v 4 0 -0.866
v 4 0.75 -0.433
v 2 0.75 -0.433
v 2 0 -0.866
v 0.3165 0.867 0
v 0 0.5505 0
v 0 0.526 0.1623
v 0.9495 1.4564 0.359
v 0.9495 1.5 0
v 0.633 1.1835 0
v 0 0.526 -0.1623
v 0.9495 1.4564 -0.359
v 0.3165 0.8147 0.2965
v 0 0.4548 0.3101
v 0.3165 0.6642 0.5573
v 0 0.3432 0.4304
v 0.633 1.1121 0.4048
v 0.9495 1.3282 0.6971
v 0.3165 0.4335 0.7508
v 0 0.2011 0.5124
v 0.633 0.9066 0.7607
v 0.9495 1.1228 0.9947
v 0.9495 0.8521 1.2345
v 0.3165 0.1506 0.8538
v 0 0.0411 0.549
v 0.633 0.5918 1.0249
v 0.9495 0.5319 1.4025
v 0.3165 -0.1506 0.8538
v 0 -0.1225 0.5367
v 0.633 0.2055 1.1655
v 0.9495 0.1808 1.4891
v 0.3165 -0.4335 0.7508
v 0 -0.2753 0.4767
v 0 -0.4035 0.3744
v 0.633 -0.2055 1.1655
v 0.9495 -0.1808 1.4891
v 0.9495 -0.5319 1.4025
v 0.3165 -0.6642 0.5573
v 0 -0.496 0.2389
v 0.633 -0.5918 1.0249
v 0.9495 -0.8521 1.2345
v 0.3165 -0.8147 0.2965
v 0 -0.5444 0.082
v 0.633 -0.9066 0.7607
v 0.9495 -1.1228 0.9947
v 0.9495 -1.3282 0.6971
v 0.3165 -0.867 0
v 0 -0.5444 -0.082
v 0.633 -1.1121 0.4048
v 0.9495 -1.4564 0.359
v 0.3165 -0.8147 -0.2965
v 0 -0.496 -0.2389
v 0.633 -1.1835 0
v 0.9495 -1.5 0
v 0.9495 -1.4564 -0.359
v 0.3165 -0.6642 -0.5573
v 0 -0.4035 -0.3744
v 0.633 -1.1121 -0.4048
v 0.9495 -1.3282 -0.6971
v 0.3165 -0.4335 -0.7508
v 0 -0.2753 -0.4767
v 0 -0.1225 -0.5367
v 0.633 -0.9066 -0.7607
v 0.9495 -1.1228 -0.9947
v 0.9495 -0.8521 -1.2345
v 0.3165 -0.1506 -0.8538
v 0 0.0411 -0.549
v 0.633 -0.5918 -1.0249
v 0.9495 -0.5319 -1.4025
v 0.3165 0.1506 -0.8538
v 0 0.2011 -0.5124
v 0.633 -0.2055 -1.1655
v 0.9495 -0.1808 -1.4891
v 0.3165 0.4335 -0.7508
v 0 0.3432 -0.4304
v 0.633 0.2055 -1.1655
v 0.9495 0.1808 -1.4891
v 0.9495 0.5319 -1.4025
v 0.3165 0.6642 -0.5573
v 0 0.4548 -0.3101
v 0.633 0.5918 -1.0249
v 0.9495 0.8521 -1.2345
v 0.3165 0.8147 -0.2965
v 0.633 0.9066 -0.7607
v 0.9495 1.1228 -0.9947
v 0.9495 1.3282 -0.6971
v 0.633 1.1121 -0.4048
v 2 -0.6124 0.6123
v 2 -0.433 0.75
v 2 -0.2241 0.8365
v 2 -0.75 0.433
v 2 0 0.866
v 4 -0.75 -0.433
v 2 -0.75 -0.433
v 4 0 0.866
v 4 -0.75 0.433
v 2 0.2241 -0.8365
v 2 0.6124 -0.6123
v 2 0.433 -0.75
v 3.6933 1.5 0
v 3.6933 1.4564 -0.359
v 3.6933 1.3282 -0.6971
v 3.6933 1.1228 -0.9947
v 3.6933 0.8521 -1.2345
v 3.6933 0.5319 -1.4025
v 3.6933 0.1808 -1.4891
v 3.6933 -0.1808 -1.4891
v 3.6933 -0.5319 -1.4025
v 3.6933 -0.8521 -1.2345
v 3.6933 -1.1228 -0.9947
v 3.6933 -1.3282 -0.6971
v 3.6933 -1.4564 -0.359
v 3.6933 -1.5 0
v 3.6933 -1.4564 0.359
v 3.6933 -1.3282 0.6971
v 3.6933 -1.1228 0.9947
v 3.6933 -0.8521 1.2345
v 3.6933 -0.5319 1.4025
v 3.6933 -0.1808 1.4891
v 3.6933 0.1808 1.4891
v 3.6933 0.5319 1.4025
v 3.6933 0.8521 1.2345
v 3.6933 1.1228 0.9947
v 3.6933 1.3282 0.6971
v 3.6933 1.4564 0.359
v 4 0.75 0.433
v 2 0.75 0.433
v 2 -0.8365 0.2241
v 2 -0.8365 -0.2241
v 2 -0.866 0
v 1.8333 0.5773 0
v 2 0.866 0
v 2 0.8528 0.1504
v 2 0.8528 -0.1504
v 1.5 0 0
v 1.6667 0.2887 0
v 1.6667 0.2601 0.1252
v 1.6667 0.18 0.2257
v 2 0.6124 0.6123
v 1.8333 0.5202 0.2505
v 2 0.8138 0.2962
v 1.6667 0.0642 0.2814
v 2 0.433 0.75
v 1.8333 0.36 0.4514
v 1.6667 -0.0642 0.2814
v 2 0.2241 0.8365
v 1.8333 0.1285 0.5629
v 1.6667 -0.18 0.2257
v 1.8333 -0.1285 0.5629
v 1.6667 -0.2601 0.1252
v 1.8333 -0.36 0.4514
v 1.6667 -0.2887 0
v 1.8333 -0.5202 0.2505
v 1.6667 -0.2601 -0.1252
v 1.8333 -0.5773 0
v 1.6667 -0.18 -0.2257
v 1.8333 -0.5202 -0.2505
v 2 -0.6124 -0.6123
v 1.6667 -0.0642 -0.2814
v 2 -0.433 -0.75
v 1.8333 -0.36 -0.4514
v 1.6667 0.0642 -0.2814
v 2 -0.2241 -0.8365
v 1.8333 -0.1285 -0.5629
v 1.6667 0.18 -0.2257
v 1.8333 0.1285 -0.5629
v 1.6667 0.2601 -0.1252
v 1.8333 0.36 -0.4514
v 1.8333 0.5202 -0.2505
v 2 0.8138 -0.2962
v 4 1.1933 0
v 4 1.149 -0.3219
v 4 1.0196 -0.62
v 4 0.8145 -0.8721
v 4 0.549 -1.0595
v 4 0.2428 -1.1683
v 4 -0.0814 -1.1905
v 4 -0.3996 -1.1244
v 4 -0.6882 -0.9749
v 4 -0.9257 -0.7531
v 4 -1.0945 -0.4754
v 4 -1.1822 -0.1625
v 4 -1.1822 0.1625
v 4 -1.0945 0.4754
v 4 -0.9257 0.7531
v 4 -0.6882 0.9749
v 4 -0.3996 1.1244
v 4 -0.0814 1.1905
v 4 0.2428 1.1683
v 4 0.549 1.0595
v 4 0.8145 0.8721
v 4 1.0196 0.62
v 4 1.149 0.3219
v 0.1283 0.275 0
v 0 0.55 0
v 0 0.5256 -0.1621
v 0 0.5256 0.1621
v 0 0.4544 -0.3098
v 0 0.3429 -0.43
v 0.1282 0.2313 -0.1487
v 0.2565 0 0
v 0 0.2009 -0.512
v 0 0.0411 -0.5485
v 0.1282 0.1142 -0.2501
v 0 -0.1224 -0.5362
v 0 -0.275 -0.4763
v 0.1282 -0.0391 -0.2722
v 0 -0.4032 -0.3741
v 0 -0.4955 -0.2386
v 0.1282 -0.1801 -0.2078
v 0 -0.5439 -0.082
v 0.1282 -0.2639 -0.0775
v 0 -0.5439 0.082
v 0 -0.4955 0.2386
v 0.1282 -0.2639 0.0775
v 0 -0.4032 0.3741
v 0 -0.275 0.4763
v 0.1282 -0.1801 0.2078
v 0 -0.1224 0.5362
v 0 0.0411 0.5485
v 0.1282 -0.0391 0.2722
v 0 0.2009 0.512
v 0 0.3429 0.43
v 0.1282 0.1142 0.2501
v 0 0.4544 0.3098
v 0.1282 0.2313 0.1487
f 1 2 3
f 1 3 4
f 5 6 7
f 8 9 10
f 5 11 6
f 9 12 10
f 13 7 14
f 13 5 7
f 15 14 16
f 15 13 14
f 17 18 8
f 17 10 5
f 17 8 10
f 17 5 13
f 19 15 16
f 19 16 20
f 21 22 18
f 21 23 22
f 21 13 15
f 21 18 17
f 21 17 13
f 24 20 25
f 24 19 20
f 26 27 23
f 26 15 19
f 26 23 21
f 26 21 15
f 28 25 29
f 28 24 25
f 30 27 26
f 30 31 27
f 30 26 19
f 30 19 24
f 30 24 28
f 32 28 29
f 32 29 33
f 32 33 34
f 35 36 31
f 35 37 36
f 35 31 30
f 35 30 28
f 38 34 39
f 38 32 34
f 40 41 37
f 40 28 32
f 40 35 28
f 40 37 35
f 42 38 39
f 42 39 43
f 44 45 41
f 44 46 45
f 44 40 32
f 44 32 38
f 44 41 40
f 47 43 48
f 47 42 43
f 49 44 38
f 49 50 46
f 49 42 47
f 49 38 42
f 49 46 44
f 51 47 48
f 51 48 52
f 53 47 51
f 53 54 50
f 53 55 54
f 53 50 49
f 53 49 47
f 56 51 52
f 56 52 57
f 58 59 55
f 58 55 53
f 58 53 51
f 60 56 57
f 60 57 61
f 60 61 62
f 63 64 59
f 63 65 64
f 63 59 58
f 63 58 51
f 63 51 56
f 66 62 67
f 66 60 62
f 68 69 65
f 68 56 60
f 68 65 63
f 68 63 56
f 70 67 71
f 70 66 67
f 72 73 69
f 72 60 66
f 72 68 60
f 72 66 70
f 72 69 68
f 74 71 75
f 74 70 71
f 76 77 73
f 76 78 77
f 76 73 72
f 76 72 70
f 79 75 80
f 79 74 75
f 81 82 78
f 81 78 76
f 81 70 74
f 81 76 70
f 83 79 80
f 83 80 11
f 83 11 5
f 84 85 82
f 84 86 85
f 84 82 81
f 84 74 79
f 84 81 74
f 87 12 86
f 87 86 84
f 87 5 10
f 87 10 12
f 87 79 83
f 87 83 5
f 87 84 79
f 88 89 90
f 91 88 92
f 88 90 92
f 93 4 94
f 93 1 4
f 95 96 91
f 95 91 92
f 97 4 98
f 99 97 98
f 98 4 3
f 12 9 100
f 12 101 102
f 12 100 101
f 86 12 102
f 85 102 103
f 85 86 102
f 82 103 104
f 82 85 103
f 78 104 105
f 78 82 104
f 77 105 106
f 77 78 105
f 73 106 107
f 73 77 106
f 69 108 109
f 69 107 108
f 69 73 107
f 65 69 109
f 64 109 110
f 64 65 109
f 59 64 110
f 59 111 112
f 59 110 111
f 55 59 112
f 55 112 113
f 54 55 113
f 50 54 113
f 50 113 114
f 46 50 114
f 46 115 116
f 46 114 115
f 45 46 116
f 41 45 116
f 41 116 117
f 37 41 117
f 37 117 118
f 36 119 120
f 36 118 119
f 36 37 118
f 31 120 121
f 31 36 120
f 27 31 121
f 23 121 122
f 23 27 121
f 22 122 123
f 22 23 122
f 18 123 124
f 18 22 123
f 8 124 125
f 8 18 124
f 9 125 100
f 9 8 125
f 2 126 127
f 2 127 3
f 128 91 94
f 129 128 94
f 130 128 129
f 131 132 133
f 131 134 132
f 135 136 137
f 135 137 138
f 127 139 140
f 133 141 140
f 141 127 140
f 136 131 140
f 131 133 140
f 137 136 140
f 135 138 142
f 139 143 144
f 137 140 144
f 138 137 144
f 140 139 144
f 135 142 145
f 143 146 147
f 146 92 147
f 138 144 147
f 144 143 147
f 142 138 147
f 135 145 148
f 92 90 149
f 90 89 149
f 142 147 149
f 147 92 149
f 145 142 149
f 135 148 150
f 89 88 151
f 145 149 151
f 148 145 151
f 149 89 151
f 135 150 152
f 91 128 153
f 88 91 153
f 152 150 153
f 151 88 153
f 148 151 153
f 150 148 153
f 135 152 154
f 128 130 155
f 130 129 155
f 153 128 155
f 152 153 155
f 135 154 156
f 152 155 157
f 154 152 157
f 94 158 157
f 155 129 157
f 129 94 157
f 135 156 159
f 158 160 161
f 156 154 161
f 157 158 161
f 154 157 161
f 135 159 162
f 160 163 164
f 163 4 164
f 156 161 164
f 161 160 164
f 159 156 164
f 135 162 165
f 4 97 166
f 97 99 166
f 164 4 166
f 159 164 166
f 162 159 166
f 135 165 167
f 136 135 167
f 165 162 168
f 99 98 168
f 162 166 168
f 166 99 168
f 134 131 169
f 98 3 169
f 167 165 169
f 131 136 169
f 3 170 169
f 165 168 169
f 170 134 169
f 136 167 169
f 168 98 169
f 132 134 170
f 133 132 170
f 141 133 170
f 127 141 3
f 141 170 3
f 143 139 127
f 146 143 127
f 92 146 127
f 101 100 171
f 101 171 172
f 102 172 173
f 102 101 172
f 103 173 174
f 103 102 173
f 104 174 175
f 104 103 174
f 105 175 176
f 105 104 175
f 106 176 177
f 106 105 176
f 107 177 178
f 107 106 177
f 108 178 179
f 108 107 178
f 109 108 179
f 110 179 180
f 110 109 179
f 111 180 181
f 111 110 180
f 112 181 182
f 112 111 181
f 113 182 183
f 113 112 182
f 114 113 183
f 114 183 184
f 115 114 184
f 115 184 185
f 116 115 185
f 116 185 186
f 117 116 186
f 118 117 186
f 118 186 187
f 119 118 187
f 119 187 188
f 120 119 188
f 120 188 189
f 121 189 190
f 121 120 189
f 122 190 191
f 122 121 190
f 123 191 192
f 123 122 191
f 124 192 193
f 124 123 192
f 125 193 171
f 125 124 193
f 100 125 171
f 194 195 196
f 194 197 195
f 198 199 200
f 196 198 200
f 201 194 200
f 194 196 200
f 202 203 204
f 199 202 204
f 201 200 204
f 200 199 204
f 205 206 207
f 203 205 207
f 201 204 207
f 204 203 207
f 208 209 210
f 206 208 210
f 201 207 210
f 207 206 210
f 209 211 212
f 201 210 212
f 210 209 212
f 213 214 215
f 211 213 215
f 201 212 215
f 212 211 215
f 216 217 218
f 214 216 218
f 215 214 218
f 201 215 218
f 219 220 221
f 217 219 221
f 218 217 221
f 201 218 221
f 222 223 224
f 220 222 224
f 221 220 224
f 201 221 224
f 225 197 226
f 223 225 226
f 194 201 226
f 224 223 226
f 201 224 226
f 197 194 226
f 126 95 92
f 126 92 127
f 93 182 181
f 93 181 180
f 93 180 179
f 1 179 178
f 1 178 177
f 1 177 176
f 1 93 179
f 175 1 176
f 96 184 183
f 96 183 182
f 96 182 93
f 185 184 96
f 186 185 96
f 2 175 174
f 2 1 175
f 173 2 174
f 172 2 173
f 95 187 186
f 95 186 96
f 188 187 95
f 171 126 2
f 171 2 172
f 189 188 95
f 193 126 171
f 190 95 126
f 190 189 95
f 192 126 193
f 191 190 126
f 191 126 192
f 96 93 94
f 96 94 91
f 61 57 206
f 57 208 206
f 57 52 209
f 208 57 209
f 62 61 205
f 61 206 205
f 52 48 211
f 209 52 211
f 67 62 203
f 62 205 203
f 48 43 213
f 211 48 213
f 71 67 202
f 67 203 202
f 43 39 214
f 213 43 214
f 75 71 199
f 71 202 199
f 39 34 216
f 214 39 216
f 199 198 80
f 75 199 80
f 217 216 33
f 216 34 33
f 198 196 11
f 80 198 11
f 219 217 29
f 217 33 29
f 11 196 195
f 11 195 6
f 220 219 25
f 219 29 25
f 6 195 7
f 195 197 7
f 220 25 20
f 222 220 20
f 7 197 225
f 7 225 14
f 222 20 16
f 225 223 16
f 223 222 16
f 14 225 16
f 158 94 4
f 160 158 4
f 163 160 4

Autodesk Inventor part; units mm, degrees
ref_plane "YZ Plane" through (0, 0, 0) normal (1, 0, 0) x (0, 1, 0)
ref_plane "XZ Plane" through (0, 0, 0) normal (0, 1, 0) x (-1, 0, 0)
sketch "Sketch1" plane through (0, 0, 0) normal (0, 0, 1) x (1, 0, 0)
  line L0 (0.2565, 0) -> (1.5, 0)
  line L1 (4, 0.866) -> (4, 1.5)
  line L2 (4, 1.5) -> (0, 1.5)
  line L3 (4, 0.866) -> (2, 0.866)
  line L4 (2, 0.866) -> (1.5, 0)
  line L5 (0, 0.55) -> (0.2565, 0)
  line L6 (0, -0.3) -> (0, 1.8) projected
  line L7 (0, 0.55) -> (0, 1.5)
  point P0 (0, 0)
  dimension "d0" = 2
  dimension "d1" = 60
  dimension "d2" = 3
  dimension "d3" = 1.7321
  dimension "d4" = 4
  dimension "d5" = 65
  dimension "d7" = 1.1
revolve "Body" add sketch "Sketch1" angle 360 about axis through (0.2565, 0, 0) along (1, 0, 0)
sketch "Sketch2" plane through (4, 0, 0) normal (1, 0, 0) x (0, 0, -1)
  circle A0 centre (0, 0) radius 0.866 projected
  circle A1 centre (0, 0) radius 1.5 projected
  line L0 (0.866, 0) -> (0.433, -0.75)
  line L1 (0.433, -0.75) -> (-0.433, -0.75)
  line L2 (-0.433, -0.75) -> (-0.866, 0)
  line L3 (-0.866, 0) -> (-0.433, 0.75)
  line L4 (-0.433, 0.75) -> (0.433, 0.75)
  line L5 (0.433, 0.75) -> (0.866, 0)
extrude "Slot" add sketch "Sketch2" against normal blind 2 contours L5 A0 | A0 L0 | L4 A0 | A0 L1 | L3 A0 | A0 L2
chamfer "Chamfer1" distance 0.95 angle 45 1 edges at (0, -1.5, 0) measured on face at (0, 1.1688, -0.1197)
thread "Thread" size "M3x0.5" class "6g" standard "ISO Metric profile" length 4
chamfer "Chamfer2" distance 0.3067 angle 45 1 edges at (4, -1.5, 0) measured on face at (1.9663, 1.4806, -0.2406)
ref_plane "Work Plane1" through (2, 0, 0) normal (0, -0.5, -0.866) x (1, 0, 0)
equation "\"d8\" = INTI"
equation "\"d10\" = -0.5 * SPD + 0.5 * NND"
equation "\"d11\" = FAWI"
equation "\"d33\" = -0.5 * SPD + 0.5 * NND"
equation "\"d14\" = NLG"
equation "\"d12\" = -0.5 * GD1 + 0.5 * NND"
equation "\"d13\" = FAWI"
equation "\"d34\" = -0.5 * GD1 + 0.5 * NND"
equation "\"d0\" = INTI"
equation "\"d2\" = NND"
equation "\"d3\" = 1.1547 * SW"
equation "\"d4\" = NLG"
equation "\"d5\" = 0.5 * ANG"
equation "\"d7\" = SPD"
equation "\"NND\" = 3"
equation "\"NLG\" = 4"
equation "\"INTI\" = 2"
equation "\"FAWI\" = 45deg"
equation "\"SW\" = 1.5"
equation "\"GD1\" = THREADDIA - 1.2269 * PTC"
equation "\"ANG\" = 130deg"
equation "\"FAWI1\" = 60deg"
equation "\"SPD\" = 1.1"
equation "\"GUL\" = 0.61345 * PTC"
equation "\"TOA\" = 30deg"
equation "\"THREADDIA\" = 3"
equation "\"PTC\" = 0.5"
equation "\"GAL\" = 0.61345 * PTC"
equation "\"E0\" = 1.155 * SW"
properties part number "AS 1421 - M3 x 4 Cup Point" material "Steel, Mild"
